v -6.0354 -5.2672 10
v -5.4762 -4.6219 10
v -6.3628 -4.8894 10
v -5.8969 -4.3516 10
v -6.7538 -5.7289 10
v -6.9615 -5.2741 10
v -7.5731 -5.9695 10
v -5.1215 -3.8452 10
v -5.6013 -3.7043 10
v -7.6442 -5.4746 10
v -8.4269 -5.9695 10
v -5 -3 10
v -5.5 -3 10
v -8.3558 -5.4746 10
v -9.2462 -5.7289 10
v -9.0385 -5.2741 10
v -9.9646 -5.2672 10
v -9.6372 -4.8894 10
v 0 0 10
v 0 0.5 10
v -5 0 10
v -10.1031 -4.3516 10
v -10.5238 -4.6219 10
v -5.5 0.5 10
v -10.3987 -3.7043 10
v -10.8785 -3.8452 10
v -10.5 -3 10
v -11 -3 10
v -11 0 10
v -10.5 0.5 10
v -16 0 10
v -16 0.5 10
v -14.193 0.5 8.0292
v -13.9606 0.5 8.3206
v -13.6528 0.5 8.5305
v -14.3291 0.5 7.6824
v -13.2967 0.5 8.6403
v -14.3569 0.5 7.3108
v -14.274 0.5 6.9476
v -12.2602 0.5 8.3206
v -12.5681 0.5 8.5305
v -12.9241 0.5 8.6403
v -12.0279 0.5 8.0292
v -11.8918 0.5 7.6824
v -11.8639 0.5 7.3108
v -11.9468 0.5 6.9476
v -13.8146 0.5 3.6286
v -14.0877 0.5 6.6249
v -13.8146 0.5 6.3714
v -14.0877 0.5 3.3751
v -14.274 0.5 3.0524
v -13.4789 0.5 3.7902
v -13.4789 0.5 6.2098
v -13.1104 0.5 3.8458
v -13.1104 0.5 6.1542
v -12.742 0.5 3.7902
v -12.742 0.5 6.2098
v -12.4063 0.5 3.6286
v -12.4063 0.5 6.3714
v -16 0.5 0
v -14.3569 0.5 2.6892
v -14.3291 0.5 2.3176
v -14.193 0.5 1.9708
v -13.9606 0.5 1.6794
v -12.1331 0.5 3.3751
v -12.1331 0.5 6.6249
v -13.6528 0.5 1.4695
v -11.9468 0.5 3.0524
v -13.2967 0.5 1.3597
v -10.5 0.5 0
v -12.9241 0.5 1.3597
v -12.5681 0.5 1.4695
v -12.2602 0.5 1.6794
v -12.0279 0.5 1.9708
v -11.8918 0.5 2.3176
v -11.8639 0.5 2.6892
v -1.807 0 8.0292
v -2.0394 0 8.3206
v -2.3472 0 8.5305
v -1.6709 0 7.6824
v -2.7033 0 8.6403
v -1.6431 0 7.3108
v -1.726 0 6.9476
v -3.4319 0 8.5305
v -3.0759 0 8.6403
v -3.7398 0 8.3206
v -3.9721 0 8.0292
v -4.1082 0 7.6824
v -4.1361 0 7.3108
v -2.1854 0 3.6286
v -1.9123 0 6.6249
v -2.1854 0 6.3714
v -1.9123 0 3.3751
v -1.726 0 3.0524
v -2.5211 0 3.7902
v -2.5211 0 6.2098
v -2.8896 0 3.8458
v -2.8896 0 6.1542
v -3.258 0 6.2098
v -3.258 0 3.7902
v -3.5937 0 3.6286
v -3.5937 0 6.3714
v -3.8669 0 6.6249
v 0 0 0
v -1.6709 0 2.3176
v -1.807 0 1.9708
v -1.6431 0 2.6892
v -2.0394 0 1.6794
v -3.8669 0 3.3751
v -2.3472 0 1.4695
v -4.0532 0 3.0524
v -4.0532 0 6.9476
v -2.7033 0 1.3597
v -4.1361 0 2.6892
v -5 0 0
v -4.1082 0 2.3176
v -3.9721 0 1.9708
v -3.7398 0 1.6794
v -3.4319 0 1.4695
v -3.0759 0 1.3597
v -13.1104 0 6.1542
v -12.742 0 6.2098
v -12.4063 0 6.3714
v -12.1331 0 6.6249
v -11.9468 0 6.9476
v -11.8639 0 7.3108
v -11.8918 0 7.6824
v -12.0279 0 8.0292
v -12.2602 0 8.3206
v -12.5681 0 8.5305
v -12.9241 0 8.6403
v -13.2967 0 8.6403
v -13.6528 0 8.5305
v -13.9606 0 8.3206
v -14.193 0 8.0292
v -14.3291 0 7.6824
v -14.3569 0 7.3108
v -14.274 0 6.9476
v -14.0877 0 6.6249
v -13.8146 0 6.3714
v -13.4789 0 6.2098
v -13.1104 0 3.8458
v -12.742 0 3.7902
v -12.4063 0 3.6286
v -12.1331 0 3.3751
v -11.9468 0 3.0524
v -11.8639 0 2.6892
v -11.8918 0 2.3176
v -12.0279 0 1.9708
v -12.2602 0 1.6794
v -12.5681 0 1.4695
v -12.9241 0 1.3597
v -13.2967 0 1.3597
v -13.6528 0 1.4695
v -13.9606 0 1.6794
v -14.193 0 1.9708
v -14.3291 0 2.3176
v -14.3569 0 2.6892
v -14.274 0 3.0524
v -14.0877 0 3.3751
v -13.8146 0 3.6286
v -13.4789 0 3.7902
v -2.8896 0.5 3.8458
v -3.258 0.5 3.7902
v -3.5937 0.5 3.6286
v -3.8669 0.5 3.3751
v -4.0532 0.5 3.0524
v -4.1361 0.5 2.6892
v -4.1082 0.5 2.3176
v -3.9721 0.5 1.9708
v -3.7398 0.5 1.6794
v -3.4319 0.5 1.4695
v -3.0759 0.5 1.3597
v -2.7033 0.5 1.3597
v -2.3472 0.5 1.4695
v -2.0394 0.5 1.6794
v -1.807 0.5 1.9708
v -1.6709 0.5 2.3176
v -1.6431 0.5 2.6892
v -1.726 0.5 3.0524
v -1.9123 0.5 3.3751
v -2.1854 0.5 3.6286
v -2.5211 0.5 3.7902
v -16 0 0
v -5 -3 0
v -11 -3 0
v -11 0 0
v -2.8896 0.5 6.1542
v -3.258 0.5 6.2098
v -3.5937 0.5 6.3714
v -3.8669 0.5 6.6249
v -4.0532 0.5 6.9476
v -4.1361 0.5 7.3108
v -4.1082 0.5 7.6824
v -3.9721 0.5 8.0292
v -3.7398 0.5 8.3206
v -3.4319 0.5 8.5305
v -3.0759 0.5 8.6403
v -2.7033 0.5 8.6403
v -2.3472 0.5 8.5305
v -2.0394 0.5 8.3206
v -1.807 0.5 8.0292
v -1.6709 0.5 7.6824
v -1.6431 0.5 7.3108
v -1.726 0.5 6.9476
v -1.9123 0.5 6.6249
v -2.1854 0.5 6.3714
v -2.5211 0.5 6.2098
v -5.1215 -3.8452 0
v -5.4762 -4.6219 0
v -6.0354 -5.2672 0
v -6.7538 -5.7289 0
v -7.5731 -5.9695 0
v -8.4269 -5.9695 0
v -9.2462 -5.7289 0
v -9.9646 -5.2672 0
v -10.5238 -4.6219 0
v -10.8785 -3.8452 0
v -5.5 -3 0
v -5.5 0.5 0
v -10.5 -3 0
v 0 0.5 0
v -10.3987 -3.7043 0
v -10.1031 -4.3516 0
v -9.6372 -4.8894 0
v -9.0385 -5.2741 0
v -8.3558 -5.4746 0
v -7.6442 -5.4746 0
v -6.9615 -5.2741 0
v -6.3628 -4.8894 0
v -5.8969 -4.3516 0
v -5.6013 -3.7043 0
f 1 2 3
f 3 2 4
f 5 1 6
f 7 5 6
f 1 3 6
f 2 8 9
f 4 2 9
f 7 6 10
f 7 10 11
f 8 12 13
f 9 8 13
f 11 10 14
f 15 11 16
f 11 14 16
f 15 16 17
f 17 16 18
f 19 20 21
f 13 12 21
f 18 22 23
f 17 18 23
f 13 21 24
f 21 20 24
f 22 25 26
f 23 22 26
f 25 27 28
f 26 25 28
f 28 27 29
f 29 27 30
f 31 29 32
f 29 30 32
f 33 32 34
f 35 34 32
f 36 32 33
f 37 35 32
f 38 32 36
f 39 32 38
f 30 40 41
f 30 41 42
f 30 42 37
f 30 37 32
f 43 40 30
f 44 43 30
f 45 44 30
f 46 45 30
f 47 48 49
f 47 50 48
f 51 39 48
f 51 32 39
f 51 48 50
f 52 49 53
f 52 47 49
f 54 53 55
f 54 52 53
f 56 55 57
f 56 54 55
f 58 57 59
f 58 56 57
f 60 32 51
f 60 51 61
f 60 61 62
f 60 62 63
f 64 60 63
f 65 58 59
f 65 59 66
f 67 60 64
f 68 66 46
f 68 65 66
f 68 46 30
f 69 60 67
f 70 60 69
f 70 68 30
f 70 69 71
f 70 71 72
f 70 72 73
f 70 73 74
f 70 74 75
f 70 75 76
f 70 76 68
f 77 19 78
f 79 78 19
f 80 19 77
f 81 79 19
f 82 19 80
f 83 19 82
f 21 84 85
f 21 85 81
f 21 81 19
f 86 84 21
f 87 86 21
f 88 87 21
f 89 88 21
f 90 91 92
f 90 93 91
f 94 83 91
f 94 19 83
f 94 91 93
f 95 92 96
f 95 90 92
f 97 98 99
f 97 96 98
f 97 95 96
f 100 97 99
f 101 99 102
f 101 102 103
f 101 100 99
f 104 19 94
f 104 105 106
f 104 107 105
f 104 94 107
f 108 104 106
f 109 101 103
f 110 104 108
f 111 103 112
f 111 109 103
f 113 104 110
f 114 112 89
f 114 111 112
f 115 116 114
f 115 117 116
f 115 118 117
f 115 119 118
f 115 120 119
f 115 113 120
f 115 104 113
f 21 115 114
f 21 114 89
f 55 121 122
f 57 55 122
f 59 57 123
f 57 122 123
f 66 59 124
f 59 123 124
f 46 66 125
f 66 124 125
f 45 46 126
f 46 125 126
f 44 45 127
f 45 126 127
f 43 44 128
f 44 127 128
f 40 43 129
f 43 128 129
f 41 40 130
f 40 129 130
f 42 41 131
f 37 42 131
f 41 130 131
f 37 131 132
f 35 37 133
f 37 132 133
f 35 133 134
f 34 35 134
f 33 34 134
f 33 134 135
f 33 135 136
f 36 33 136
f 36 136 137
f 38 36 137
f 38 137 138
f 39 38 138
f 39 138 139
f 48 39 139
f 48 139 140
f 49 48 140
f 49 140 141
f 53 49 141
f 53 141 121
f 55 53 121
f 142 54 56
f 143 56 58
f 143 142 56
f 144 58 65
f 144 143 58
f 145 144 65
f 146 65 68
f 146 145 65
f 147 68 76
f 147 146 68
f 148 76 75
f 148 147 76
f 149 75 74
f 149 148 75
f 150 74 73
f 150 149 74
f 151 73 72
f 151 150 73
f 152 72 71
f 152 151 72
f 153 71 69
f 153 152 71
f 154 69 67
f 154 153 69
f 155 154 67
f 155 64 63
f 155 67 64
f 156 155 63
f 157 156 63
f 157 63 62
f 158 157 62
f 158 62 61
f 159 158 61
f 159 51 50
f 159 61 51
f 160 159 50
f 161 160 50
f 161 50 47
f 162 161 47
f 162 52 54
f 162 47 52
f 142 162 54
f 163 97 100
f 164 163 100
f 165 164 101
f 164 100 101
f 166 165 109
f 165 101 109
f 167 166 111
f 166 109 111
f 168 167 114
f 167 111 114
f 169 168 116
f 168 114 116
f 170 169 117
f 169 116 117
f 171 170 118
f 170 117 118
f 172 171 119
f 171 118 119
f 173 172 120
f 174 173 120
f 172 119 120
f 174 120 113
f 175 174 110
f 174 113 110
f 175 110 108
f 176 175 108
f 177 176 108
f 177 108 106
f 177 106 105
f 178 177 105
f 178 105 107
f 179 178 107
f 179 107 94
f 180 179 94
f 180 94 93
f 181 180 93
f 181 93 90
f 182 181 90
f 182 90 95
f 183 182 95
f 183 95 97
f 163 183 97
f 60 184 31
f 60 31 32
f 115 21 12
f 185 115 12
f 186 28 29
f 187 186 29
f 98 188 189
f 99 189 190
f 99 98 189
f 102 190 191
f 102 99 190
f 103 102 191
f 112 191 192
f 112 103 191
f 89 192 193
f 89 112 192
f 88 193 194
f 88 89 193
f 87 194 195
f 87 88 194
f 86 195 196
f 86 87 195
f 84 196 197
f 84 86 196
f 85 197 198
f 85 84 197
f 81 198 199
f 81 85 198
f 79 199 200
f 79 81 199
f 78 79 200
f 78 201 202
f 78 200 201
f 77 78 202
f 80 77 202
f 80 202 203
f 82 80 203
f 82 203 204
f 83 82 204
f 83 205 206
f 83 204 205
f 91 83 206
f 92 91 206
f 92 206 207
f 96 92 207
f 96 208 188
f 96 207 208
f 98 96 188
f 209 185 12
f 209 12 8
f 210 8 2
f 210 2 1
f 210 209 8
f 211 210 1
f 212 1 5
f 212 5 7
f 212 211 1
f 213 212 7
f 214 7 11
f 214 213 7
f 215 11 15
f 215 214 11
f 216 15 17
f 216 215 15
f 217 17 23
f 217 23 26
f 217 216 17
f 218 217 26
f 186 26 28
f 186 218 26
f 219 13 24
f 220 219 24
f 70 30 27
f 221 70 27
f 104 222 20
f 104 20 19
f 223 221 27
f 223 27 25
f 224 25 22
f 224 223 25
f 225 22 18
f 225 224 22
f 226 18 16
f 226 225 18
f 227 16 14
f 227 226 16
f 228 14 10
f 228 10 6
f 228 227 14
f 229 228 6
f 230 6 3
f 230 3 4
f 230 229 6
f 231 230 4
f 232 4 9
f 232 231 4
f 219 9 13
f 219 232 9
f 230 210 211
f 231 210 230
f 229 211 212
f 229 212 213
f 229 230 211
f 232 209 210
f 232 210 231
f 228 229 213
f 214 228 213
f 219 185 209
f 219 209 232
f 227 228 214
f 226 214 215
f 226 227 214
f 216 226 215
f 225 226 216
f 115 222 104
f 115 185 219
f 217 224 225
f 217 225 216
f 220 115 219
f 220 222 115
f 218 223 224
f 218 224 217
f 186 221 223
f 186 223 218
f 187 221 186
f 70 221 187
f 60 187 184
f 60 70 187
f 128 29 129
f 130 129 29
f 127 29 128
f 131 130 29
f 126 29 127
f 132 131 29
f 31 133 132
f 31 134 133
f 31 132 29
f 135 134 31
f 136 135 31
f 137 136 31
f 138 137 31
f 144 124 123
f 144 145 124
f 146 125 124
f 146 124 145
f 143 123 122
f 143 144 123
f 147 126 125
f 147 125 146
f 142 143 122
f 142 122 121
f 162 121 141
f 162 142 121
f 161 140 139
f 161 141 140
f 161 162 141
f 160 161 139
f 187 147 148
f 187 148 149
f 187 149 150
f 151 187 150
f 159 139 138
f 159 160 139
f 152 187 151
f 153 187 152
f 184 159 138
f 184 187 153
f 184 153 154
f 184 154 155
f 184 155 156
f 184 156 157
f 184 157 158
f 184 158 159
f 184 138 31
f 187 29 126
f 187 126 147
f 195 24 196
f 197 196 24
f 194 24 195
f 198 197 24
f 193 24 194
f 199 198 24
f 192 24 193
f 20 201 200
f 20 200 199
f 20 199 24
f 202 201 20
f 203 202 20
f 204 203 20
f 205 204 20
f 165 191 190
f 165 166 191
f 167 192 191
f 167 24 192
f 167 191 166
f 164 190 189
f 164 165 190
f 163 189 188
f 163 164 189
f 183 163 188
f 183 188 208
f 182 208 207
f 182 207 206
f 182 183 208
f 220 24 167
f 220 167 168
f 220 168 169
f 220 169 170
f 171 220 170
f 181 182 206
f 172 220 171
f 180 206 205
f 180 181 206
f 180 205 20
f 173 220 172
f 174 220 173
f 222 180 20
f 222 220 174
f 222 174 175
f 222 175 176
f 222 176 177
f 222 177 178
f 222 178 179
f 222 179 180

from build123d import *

# Parameters (mm, degrees)
EXTRUDE_THIN4_DEPTH     = 10
SKETCH2_R               = 1.25
CUT_EXTRUDE1_DEPTH      = 20.798989873
MIRROR2_COPY_1_SKETCH_R = 1.25
MIRROR2_COPY_1_DEPTH    = 20.798989873


with BuildPart() as part:
    # Sketch1 → Extrude-Thin4 (new body)
    with BuildSketch(Plane.XY):
        with BuildLine():
            Line((0, 0), (-5, 0))
            Line((-5, 0), (-5, -3))
            ThreePointArc((-5, -3), (-8, -6), (-11, -3))
            Line((-11, -3), (-11, 0))
            Line((-11, 0), (-16, 0))
            Line((-16, 0), (-16, 0.5))
            Line((-16, 0.5), (-10.5, 0.5))
            Line((-10.5, 0.5), (-10.5, -3))
            ThreePointArc((-10.5, -3), (-8, -5.5), (-5.5, -3))
            Line((-5.5, -3), (-5.5, 0.5))
            Line((-5.5, 0.5), (0, 0.5))
            Line((0, 0.5), (0, 0))
        make_face()
    extrude(amount=EXTRUDE_THIN4_DEPTH)

    # Sketch2 → Cut-Extrude1 (cut, through all)
    with BuildSketch(Plane(origin=(0, 0, 0), x_dir=(1, 0, 0), z_dir=(0, 1, 0))):
        with Locations(Location((-13.110421324, -2.595753644, 0), (0, 0, 270))):
            Circle(SKETCH2_R)
    cut_extrude1 = extrude(amount=CUT_EXTRUDE1_DEPTH, mode=Mode.SUBTRACT)

    # Mirror1: Cut-Extrude1 across plane
    add(cut_extrude1.mirror(Plane.XY.offset(5)), mode=Mode.SUBTRACT)

    # Mirror2: Cut-Extrude1 across plane
    add(cut_extrude1.mirror(Plane(origin=(-8, 0, 0), x_dir=(0, 0, 1), z_dir=(1, 0, 0))), mode=Mode.SUBTRACT)

    # Mirror2 copy 1 sketch → Mirror2 copy 1 (cut, through all)
    with BuildSketch(Plane(origin=(-16, 0, 10), x_dir=(-1, 0, 0), z_dir=(0, 1, 0))):
        with Locations(Location((-13.110421324, -2.595753644, 0), (0, 0, 270))):
            Circle(MIRROR2_COPY_1_SKETCH_R)
    extrude(amount=MIRROR2_COPY_1_DEPTH, mode=Mode.SUBTRACT)


solid = part.part
